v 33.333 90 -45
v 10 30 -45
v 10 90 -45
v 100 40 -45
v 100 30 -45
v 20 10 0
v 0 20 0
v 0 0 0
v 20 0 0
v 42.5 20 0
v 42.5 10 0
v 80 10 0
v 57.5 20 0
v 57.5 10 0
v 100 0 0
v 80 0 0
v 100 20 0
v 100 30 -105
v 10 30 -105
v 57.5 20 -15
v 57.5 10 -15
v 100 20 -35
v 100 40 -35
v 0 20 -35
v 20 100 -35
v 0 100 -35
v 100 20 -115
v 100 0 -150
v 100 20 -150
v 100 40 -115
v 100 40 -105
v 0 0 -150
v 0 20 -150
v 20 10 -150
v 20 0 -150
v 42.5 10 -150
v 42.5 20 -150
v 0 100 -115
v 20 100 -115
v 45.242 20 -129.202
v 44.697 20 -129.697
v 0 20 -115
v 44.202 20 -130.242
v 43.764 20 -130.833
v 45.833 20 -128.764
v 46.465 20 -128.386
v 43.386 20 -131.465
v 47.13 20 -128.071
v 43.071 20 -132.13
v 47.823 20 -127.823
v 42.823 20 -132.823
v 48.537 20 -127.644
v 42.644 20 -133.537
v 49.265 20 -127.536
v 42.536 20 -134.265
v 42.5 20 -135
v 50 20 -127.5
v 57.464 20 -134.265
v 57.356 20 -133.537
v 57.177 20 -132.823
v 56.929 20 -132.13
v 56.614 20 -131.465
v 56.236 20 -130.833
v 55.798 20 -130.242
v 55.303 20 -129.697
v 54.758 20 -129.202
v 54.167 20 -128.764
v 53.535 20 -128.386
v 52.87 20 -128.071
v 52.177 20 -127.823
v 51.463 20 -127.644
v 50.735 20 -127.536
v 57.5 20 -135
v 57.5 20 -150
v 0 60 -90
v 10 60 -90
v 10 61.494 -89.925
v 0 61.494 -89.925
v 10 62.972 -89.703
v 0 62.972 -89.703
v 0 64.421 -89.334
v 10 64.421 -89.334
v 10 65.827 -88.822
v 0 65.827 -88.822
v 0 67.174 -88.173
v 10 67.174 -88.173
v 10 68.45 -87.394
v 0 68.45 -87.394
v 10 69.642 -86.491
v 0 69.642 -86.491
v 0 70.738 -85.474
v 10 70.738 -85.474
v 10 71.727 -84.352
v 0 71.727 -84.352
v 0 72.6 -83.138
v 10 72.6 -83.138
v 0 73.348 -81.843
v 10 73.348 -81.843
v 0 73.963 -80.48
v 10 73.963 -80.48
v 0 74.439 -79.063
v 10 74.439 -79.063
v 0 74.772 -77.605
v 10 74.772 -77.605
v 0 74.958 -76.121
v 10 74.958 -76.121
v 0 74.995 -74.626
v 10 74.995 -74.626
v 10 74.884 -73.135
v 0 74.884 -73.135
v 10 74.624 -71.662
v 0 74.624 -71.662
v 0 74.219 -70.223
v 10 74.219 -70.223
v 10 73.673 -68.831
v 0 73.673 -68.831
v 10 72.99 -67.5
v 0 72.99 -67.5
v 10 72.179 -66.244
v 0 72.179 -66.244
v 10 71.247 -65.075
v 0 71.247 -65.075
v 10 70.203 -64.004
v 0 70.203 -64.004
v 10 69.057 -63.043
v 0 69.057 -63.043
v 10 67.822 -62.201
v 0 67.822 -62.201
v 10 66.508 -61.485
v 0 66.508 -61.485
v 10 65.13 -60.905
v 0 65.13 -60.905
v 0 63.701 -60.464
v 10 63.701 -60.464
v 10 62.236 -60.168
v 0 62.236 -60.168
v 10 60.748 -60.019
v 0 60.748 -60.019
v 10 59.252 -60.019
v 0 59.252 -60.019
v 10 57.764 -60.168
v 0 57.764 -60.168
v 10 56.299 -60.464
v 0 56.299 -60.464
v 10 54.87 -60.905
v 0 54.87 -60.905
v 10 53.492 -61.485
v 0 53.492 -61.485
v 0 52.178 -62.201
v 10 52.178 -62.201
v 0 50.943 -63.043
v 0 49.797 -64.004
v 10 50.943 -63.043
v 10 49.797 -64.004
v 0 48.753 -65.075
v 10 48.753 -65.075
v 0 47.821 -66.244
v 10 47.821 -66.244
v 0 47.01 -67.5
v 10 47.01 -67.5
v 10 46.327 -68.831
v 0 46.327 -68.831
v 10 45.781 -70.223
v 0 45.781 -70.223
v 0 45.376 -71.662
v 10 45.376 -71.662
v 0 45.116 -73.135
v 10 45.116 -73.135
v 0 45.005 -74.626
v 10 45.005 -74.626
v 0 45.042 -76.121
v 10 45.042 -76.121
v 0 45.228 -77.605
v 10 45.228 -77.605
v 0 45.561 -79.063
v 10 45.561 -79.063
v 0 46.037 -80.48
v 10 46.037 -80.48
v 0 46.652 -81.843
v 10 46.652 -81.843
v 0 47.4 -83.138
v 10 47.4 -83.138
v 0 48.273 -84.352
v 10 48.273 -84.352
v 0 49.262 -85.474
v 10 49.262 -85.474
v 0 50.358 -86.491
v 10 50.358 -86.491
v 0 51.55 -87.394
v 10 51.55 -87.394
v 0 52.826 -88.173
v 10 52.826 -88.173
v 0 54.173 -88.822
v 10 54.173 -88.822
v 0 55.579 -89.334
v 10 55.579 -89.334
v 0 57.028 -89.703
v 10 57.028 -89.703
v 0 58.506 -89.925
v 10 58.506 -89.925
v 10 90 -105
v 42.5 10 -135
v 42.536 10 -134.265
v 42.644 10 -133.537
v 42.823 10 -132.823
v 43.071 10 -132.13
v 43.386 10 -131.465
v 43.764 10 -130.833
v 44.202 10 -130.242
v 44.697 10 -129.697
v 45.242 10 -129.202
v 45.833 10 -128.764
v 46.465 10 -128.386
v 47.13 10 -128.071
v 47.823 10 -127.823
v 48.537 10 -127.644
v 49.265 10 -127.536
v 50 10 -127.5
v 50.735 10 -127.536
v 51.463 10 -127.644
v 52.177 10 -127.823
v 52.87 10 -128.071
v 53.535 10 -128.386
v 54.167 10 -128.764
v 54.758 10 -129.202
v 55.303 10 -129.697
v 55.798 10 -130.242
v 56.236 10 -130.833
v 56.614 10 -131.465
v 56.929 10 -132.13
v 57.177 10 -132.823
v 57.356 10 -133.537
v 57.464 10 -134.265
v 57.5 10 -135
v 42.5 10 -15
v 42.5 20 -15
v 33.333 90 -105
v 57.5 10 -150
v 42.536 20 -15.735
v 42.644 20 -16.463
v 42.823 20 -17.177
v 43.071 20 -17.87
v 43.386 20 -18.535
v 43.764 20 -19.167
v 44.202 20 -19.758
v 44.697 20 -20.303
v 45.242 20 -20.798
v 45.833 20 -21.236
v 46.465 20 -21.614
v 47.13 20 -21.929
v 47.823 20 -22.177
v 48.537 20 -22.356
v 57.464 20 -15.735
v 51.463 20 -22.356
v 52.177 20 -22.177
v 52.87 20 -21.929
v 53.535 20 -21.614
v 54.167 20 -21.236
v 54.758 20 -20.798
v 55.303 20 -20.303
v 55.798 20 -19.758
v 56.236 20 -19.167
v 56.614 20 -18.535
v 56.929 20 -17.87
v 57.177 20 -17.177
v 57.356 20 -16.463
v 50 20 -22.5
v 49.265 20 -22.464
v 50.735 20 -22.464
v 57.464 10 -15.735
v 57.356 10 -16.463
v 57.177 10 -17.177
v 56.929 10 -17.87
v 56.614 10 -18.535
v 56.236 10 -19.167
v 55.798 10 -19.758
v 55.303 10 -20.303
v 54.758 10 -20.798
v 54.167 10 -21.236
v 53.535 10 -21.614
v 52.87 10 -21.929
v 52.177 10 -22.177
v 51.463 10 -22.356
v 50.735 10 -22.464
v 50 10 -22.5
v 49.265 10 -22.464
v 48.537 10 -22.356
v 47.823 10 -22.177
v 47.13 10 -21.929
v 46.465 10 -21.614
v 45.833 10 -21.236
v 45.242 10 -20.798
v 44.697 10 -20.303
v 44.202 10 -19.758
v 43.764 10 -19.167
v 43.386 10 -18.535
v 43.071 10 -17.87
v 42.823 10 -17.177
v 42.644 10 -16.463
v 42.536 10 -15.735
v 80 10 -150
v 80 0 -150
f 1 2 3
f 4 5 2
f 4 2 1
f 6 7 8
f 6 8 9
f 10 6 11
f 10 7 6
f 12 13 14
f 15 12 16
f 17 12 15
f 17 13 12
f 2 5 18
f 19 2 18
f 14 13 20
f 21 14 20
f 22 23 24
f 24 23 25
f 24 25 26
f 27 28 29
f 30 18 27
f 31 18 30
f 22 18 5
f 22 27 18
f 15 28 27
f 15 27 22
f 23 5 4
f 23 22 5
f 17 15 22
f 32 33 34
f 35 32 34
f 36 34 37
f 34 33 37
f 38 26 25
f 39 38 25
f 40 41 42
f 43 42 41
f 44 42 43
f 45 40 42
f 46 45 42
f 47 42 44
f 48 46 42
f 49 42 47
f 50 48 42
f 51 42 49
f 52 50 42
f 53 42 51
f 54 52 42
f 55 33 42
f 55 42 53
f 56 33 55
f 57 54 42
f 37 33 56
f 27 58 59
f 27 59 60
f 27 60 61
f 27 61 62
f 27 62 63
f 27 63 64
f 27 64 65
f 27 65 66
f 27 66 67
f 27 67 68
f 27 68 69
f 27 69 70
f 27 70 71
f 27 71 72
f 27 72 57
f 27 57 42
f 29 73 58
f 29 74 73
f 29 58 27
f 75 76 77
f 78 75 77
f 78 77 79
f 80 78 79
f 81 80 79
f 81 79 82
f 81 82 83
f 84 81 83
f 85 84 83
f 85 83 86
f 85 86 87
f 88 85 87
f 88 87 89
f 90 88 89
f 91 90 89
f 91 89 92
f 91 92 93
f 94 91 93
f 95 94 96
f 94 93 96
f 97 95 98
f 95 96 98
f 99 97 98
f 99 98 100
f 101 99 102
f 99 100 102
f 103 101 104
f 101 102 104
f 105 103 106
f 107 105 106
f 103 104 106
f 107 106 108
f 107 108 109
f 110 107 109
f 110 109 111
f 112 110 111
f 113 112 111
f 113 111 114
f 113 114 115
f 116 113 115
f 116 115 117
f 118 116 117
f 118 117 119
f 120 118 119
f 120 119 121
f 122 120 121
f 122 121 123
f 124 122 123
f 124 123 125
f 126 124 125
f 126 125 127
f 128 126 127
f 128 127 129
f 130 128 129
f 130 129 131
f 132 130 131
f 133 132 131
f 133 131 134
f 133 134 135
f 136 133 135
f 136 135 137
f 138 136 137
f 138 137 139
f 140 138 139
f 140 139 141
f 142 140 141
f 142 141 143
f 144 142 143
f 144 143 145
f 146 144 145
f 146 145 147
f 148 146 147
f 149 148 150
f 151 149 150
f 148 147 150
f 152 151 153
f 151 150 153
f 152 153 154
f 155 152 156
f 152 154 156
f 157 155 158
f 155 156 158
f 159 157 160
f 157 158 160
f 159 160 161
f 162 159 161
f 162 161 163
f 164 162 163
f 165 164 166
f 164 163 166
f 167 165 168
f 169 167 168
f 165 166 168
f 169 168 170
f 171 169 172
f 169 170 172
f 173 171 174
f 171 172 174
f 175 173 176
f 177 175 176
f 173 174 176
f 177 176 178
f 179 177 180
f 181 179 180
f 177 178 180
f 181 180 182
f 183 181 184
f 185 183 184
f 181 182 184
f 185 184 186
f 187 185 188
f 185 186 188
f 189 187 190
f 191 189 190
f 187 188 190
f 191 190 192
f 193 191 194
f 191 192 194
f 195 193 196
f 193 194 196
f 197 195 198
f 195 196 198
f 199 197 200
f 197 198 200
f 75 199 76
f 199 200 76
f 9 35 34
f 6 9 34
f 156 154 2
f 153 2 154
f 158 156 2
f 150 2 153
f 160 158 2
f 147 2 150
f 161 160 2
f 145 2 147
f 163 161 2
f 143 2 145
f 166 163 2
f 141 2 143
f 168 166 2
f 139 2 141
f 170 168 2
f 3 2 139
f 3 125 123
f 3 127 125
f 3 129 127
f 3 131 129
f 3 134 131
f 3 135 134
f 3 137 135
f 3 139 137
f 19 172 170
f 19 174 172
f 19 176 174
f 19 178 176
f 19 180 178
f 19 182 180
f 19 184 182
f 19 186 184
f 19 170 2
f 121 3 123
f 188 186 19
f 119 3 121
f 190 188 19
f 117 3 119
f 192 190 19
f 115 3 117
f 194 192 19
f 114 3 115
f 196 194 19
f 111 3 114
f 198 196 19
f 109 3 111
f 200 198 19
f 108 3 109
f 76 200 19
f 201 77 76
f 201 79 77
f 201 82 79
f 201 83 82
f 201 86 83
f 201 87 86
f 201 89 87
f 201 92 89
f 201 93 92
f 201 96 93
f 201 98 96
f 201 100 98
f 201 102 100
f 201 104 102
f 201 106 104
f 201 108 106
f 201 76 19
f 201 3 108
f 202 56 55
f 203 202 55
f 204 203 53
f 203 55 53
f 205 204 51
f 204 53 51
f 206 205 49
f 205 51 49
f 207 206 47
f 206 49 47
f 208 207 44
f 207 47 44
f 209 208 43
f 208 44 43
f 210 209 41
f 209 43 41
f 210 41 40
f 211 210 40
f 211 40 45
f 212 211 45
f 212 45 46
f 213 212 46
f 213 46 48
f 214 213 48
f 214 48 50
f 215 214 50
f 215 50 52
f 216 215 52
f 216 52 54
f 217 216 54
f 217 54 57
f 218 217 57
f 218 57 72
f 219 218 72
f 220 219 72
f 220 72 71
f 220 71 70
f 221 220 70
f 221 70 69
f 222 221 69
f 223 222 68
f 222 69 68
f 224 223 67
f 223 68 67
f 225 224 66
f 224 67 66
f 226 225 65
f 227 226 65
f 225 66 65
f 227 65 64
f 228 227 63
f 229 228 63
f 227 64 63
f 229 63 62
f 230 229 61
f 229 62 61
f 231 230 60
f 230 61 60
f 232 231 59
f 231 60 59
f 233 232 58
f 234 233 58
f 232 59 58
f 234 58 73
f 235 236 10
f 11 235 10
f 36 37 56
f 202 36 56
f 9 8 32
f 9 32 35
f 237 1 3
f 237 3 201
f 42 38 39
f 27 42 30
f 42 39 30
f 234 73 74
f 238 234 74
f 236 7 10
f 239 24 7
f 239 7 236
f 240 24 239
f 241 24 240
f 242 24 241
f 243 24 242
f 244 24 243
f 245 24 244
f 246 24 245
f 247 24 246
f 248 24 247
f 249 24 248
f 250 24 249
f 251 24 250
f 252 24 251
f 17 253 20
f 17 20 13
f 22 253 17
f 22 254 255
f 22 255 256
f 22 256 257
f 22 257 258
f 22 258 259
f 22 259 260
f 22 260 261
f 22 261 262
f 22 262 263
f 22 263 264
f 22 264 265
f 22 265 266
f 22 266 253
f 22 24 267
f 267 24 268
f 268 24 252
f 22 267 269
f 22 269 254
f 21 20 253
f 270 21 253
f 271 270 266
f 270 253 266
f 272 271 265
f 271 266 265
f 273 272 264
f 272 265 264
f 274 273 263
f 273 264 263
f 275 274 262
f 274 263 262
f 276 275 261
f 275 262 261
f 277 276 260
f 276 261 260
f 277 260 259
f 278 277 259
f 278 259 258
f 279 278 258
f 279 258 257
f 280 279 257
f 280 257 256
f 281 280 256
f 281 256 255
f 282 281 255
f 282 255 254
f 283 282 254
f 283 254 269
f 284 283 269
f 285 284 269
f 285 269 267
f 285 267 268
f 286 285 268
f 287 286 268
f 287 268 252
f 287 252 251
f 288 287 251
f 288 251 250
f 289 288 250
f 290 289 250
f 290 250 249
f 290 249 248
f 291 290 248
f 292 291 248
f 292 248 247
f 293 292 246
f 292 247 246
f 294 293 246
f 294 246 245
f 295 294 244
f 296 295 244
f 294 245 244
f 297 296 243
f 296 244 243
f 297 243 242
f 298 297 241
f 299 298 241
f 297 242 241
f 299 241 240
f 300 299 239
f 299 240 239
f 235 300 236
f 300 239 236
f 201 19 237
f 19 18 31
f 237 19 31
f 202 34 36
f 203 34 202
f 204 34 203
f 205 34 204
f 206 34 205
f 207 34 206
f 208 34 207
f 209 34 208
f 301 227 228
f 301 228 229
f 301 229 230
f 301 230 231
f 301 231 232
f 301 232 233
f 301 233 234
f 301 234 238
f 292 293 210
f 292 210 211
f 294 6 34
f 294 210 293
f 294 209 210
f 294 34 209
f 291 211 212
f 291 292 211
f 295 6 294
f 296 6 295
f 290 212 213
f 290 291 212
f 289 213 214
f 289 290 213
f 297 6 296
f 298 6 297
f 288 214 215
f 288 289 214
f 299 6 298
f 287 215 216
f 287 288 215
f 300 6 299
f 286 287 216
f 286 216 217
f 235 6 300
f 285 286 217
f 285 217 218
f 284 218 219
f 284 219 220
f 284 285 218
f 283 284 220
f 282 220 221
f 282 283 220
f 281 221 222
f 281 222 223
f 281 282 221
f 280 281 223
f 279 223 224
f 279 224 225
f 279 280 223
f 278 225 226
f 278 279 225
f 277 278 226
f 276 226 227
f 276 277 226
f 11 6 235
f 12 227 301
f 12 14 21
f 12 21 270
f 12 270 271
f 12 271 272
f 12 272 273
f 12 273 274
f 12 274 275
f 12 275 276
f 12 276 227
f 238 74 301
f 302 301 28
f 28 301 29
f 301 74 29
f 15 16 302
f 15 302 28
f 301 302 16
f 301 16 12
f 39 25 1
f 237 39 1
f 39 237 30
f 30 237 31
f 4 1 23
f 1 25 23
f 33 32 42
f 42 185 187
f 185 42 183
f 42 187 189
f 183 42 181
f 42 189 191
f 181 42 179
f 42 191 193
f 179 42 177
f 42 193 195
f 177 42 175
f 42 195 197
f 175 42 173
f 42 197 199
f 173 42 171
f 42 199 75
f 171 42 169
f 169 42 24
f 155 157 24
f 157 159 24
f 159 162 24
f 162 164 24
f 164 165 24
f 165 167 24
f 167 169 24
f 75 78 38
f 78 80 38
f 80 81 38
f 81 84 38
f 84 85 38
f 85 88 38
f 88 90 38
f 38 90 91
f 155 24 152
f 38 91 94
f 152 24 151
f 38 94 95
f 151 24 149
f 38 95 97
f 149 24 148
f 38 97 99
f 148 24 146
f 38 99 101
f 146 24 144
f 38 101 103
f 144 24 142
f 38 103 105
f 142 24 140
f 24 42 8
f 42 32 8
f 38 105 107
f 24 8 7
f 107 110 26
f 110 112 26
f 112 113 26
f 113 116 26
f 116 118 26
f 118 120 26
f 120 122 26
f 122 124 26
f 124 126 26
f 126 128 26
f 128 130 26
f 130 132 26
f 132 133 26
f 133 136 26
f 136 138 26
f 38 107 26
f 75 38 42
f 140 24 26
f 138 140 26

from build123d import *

# Parameters (mm, degrees)
SKETCH1_W           = 100
SKETCH1_H           = 100
BOSS_EXTRUDE2_DEPTH = 150
CUT_EXTRUDE1_DEPTH  = 80
CUT_EXTRUDE2_DEPTH  = 103
SKETCH3_W           = 60
SKETCH3_H           = 10
CUT_EXTRUDE3_DEPTH  = 178
CUT_EXTRUDE4_DEPTH  = 81
SKETCH5_W           = 60
SKETCH5_H           = 60
SKETCH5_R           = 15
CUT_EXTRUDE5_DEPTH  = 90
SKETCH6_R           = 15
CUT_EXTRUDE6_DEPTH  = 128


with BuildPart() as part:
    # Sketch1 → Boss-Extrude2 (new body)
    with BuildSketch(Plane.XY):
        with Locations((50, 50)):
            Rectangle(SKETCH1_W, SKETCH1_H)
    extrude(amount=-BOSS_EXTRUDE2_DEPTH)

    # Sketch2 → Cut-Extrude1 (cut)
    with BuildSketch(Plane(origin=(0, 100, 0), x_dir=(1, 0, 0), z_dir=(0, 1, 0))):
        with BuildLine():
            Line((100, 35), (0, 35))
            Line((0, 35), (0, 0))
            Line((0, 0), (42.5, 0))
            Line((42.5, 0), (42.5, 15))
            ThreePointArc((42.5, 15), (50, 22.5), (57.5, 15))
            Line((57.5, 15), (57.5, 0))
            Line((57.5, 0), (100, 0))
            Line((100, 0), (100, 35))
        make_face()
        with BuildLine():
            ThreePointArc((57.5, 135), (50, 127.5), (42.5, 135))
            Line((42.5, 135), (42.5, 150))
            Line((42.5, 150), (0, 150))
            Line((0, 150), (0, 115))
            Line((0, 115), (100, 115))
            Line((100, 115), (100, 150))
            Line((100, 150), (57.5, 150))
            Line((57.5, 150), (57.5, 135))
        make_face()
    extrude(amount=-CUT_EXTRUDE1_DEPTH, mode=Mode.SUBTRACT)

    # Sketch2<3> → Cut-Extrude2 (cut)
    with BuildSketch(Plane(origin=(0, 100, 0), x_dir=(1, 0, 0), z_dir=(0, 1, 0))):
        with BuildLine():
            Line((57.5, 0), (57.5, 15))
            ThreePointArc((57.5, 15), (50, 22.5), (42.5, 15))
            Line((42.5, 15), (42.5, 0))
            Line((42.5, 0), (57.5, 0))
        make_face()
        with BuildLine():
            Line((42.5, 150), (42.5, 135))
            ThreePointArc((42.5, 135), (50, 127.5), (57.5, 135))
            Line((57.5, 135), (57.5, 150))
            Line((57.5, 150), (42.5, 150))
        make_face()
    extrude(amount=-CUT_EXTRUDE2_DEPTH, mode=Mode.SUBTRACT)

    # Sketch3 → Cut-Extrude3 (cut)
    with BuildSketch(Plane.XY):
        with Locations((50, 5)):
            Rectangle(SKETCH3_W, SKETCH3_H)
    extrude(amount=-CUT_EXTRUDE3_DEPTH, mode=Mode.SUBTRACT)

    # Sketch4 → Cut-Extrude4 (cut)
    with BuildSketch(Plane.XY.offset(-35)):
        Polygon((100, 100), (20, 100), (100, 40), align=None)
    extrude(amount=-CUT_EXTRUDE4_DEPTH, mode=Mode.SUBTRACT)

    # Sketch5 → Cut-Extrude5 (cut)
    with BuildSketch(Plane(origin=(100, 0, 0), x_dir=(0, 0, -1), z_dir=(1, 0, 0))):
        with Locations((75, 60)):
            Rectangle(SKETCH5_W, SKETCH5_H)
        with Locations((75, 60)):
            Circle(SKETCH5_R, mode=Mode.SUBTRACT)
    extrude(amount=-CUT_EXTRUDE5_DEPTH, mode=Mode.SUBTRACT)

    # Sketch6 → Cut-Extrude6 (cut)
    with BuildSketch(Plane(origin=(100, 0, 0), x_dir=(0, 0, -1), z_dir=(1, 0, 0))):
        with Locations((75, 60)):
            Circle(SKETCH6_R)
    extrude(amount=-CUT_EXTRUDE6_DEPTH, mode=Mode.SUBTRACT)


solid = part.part
